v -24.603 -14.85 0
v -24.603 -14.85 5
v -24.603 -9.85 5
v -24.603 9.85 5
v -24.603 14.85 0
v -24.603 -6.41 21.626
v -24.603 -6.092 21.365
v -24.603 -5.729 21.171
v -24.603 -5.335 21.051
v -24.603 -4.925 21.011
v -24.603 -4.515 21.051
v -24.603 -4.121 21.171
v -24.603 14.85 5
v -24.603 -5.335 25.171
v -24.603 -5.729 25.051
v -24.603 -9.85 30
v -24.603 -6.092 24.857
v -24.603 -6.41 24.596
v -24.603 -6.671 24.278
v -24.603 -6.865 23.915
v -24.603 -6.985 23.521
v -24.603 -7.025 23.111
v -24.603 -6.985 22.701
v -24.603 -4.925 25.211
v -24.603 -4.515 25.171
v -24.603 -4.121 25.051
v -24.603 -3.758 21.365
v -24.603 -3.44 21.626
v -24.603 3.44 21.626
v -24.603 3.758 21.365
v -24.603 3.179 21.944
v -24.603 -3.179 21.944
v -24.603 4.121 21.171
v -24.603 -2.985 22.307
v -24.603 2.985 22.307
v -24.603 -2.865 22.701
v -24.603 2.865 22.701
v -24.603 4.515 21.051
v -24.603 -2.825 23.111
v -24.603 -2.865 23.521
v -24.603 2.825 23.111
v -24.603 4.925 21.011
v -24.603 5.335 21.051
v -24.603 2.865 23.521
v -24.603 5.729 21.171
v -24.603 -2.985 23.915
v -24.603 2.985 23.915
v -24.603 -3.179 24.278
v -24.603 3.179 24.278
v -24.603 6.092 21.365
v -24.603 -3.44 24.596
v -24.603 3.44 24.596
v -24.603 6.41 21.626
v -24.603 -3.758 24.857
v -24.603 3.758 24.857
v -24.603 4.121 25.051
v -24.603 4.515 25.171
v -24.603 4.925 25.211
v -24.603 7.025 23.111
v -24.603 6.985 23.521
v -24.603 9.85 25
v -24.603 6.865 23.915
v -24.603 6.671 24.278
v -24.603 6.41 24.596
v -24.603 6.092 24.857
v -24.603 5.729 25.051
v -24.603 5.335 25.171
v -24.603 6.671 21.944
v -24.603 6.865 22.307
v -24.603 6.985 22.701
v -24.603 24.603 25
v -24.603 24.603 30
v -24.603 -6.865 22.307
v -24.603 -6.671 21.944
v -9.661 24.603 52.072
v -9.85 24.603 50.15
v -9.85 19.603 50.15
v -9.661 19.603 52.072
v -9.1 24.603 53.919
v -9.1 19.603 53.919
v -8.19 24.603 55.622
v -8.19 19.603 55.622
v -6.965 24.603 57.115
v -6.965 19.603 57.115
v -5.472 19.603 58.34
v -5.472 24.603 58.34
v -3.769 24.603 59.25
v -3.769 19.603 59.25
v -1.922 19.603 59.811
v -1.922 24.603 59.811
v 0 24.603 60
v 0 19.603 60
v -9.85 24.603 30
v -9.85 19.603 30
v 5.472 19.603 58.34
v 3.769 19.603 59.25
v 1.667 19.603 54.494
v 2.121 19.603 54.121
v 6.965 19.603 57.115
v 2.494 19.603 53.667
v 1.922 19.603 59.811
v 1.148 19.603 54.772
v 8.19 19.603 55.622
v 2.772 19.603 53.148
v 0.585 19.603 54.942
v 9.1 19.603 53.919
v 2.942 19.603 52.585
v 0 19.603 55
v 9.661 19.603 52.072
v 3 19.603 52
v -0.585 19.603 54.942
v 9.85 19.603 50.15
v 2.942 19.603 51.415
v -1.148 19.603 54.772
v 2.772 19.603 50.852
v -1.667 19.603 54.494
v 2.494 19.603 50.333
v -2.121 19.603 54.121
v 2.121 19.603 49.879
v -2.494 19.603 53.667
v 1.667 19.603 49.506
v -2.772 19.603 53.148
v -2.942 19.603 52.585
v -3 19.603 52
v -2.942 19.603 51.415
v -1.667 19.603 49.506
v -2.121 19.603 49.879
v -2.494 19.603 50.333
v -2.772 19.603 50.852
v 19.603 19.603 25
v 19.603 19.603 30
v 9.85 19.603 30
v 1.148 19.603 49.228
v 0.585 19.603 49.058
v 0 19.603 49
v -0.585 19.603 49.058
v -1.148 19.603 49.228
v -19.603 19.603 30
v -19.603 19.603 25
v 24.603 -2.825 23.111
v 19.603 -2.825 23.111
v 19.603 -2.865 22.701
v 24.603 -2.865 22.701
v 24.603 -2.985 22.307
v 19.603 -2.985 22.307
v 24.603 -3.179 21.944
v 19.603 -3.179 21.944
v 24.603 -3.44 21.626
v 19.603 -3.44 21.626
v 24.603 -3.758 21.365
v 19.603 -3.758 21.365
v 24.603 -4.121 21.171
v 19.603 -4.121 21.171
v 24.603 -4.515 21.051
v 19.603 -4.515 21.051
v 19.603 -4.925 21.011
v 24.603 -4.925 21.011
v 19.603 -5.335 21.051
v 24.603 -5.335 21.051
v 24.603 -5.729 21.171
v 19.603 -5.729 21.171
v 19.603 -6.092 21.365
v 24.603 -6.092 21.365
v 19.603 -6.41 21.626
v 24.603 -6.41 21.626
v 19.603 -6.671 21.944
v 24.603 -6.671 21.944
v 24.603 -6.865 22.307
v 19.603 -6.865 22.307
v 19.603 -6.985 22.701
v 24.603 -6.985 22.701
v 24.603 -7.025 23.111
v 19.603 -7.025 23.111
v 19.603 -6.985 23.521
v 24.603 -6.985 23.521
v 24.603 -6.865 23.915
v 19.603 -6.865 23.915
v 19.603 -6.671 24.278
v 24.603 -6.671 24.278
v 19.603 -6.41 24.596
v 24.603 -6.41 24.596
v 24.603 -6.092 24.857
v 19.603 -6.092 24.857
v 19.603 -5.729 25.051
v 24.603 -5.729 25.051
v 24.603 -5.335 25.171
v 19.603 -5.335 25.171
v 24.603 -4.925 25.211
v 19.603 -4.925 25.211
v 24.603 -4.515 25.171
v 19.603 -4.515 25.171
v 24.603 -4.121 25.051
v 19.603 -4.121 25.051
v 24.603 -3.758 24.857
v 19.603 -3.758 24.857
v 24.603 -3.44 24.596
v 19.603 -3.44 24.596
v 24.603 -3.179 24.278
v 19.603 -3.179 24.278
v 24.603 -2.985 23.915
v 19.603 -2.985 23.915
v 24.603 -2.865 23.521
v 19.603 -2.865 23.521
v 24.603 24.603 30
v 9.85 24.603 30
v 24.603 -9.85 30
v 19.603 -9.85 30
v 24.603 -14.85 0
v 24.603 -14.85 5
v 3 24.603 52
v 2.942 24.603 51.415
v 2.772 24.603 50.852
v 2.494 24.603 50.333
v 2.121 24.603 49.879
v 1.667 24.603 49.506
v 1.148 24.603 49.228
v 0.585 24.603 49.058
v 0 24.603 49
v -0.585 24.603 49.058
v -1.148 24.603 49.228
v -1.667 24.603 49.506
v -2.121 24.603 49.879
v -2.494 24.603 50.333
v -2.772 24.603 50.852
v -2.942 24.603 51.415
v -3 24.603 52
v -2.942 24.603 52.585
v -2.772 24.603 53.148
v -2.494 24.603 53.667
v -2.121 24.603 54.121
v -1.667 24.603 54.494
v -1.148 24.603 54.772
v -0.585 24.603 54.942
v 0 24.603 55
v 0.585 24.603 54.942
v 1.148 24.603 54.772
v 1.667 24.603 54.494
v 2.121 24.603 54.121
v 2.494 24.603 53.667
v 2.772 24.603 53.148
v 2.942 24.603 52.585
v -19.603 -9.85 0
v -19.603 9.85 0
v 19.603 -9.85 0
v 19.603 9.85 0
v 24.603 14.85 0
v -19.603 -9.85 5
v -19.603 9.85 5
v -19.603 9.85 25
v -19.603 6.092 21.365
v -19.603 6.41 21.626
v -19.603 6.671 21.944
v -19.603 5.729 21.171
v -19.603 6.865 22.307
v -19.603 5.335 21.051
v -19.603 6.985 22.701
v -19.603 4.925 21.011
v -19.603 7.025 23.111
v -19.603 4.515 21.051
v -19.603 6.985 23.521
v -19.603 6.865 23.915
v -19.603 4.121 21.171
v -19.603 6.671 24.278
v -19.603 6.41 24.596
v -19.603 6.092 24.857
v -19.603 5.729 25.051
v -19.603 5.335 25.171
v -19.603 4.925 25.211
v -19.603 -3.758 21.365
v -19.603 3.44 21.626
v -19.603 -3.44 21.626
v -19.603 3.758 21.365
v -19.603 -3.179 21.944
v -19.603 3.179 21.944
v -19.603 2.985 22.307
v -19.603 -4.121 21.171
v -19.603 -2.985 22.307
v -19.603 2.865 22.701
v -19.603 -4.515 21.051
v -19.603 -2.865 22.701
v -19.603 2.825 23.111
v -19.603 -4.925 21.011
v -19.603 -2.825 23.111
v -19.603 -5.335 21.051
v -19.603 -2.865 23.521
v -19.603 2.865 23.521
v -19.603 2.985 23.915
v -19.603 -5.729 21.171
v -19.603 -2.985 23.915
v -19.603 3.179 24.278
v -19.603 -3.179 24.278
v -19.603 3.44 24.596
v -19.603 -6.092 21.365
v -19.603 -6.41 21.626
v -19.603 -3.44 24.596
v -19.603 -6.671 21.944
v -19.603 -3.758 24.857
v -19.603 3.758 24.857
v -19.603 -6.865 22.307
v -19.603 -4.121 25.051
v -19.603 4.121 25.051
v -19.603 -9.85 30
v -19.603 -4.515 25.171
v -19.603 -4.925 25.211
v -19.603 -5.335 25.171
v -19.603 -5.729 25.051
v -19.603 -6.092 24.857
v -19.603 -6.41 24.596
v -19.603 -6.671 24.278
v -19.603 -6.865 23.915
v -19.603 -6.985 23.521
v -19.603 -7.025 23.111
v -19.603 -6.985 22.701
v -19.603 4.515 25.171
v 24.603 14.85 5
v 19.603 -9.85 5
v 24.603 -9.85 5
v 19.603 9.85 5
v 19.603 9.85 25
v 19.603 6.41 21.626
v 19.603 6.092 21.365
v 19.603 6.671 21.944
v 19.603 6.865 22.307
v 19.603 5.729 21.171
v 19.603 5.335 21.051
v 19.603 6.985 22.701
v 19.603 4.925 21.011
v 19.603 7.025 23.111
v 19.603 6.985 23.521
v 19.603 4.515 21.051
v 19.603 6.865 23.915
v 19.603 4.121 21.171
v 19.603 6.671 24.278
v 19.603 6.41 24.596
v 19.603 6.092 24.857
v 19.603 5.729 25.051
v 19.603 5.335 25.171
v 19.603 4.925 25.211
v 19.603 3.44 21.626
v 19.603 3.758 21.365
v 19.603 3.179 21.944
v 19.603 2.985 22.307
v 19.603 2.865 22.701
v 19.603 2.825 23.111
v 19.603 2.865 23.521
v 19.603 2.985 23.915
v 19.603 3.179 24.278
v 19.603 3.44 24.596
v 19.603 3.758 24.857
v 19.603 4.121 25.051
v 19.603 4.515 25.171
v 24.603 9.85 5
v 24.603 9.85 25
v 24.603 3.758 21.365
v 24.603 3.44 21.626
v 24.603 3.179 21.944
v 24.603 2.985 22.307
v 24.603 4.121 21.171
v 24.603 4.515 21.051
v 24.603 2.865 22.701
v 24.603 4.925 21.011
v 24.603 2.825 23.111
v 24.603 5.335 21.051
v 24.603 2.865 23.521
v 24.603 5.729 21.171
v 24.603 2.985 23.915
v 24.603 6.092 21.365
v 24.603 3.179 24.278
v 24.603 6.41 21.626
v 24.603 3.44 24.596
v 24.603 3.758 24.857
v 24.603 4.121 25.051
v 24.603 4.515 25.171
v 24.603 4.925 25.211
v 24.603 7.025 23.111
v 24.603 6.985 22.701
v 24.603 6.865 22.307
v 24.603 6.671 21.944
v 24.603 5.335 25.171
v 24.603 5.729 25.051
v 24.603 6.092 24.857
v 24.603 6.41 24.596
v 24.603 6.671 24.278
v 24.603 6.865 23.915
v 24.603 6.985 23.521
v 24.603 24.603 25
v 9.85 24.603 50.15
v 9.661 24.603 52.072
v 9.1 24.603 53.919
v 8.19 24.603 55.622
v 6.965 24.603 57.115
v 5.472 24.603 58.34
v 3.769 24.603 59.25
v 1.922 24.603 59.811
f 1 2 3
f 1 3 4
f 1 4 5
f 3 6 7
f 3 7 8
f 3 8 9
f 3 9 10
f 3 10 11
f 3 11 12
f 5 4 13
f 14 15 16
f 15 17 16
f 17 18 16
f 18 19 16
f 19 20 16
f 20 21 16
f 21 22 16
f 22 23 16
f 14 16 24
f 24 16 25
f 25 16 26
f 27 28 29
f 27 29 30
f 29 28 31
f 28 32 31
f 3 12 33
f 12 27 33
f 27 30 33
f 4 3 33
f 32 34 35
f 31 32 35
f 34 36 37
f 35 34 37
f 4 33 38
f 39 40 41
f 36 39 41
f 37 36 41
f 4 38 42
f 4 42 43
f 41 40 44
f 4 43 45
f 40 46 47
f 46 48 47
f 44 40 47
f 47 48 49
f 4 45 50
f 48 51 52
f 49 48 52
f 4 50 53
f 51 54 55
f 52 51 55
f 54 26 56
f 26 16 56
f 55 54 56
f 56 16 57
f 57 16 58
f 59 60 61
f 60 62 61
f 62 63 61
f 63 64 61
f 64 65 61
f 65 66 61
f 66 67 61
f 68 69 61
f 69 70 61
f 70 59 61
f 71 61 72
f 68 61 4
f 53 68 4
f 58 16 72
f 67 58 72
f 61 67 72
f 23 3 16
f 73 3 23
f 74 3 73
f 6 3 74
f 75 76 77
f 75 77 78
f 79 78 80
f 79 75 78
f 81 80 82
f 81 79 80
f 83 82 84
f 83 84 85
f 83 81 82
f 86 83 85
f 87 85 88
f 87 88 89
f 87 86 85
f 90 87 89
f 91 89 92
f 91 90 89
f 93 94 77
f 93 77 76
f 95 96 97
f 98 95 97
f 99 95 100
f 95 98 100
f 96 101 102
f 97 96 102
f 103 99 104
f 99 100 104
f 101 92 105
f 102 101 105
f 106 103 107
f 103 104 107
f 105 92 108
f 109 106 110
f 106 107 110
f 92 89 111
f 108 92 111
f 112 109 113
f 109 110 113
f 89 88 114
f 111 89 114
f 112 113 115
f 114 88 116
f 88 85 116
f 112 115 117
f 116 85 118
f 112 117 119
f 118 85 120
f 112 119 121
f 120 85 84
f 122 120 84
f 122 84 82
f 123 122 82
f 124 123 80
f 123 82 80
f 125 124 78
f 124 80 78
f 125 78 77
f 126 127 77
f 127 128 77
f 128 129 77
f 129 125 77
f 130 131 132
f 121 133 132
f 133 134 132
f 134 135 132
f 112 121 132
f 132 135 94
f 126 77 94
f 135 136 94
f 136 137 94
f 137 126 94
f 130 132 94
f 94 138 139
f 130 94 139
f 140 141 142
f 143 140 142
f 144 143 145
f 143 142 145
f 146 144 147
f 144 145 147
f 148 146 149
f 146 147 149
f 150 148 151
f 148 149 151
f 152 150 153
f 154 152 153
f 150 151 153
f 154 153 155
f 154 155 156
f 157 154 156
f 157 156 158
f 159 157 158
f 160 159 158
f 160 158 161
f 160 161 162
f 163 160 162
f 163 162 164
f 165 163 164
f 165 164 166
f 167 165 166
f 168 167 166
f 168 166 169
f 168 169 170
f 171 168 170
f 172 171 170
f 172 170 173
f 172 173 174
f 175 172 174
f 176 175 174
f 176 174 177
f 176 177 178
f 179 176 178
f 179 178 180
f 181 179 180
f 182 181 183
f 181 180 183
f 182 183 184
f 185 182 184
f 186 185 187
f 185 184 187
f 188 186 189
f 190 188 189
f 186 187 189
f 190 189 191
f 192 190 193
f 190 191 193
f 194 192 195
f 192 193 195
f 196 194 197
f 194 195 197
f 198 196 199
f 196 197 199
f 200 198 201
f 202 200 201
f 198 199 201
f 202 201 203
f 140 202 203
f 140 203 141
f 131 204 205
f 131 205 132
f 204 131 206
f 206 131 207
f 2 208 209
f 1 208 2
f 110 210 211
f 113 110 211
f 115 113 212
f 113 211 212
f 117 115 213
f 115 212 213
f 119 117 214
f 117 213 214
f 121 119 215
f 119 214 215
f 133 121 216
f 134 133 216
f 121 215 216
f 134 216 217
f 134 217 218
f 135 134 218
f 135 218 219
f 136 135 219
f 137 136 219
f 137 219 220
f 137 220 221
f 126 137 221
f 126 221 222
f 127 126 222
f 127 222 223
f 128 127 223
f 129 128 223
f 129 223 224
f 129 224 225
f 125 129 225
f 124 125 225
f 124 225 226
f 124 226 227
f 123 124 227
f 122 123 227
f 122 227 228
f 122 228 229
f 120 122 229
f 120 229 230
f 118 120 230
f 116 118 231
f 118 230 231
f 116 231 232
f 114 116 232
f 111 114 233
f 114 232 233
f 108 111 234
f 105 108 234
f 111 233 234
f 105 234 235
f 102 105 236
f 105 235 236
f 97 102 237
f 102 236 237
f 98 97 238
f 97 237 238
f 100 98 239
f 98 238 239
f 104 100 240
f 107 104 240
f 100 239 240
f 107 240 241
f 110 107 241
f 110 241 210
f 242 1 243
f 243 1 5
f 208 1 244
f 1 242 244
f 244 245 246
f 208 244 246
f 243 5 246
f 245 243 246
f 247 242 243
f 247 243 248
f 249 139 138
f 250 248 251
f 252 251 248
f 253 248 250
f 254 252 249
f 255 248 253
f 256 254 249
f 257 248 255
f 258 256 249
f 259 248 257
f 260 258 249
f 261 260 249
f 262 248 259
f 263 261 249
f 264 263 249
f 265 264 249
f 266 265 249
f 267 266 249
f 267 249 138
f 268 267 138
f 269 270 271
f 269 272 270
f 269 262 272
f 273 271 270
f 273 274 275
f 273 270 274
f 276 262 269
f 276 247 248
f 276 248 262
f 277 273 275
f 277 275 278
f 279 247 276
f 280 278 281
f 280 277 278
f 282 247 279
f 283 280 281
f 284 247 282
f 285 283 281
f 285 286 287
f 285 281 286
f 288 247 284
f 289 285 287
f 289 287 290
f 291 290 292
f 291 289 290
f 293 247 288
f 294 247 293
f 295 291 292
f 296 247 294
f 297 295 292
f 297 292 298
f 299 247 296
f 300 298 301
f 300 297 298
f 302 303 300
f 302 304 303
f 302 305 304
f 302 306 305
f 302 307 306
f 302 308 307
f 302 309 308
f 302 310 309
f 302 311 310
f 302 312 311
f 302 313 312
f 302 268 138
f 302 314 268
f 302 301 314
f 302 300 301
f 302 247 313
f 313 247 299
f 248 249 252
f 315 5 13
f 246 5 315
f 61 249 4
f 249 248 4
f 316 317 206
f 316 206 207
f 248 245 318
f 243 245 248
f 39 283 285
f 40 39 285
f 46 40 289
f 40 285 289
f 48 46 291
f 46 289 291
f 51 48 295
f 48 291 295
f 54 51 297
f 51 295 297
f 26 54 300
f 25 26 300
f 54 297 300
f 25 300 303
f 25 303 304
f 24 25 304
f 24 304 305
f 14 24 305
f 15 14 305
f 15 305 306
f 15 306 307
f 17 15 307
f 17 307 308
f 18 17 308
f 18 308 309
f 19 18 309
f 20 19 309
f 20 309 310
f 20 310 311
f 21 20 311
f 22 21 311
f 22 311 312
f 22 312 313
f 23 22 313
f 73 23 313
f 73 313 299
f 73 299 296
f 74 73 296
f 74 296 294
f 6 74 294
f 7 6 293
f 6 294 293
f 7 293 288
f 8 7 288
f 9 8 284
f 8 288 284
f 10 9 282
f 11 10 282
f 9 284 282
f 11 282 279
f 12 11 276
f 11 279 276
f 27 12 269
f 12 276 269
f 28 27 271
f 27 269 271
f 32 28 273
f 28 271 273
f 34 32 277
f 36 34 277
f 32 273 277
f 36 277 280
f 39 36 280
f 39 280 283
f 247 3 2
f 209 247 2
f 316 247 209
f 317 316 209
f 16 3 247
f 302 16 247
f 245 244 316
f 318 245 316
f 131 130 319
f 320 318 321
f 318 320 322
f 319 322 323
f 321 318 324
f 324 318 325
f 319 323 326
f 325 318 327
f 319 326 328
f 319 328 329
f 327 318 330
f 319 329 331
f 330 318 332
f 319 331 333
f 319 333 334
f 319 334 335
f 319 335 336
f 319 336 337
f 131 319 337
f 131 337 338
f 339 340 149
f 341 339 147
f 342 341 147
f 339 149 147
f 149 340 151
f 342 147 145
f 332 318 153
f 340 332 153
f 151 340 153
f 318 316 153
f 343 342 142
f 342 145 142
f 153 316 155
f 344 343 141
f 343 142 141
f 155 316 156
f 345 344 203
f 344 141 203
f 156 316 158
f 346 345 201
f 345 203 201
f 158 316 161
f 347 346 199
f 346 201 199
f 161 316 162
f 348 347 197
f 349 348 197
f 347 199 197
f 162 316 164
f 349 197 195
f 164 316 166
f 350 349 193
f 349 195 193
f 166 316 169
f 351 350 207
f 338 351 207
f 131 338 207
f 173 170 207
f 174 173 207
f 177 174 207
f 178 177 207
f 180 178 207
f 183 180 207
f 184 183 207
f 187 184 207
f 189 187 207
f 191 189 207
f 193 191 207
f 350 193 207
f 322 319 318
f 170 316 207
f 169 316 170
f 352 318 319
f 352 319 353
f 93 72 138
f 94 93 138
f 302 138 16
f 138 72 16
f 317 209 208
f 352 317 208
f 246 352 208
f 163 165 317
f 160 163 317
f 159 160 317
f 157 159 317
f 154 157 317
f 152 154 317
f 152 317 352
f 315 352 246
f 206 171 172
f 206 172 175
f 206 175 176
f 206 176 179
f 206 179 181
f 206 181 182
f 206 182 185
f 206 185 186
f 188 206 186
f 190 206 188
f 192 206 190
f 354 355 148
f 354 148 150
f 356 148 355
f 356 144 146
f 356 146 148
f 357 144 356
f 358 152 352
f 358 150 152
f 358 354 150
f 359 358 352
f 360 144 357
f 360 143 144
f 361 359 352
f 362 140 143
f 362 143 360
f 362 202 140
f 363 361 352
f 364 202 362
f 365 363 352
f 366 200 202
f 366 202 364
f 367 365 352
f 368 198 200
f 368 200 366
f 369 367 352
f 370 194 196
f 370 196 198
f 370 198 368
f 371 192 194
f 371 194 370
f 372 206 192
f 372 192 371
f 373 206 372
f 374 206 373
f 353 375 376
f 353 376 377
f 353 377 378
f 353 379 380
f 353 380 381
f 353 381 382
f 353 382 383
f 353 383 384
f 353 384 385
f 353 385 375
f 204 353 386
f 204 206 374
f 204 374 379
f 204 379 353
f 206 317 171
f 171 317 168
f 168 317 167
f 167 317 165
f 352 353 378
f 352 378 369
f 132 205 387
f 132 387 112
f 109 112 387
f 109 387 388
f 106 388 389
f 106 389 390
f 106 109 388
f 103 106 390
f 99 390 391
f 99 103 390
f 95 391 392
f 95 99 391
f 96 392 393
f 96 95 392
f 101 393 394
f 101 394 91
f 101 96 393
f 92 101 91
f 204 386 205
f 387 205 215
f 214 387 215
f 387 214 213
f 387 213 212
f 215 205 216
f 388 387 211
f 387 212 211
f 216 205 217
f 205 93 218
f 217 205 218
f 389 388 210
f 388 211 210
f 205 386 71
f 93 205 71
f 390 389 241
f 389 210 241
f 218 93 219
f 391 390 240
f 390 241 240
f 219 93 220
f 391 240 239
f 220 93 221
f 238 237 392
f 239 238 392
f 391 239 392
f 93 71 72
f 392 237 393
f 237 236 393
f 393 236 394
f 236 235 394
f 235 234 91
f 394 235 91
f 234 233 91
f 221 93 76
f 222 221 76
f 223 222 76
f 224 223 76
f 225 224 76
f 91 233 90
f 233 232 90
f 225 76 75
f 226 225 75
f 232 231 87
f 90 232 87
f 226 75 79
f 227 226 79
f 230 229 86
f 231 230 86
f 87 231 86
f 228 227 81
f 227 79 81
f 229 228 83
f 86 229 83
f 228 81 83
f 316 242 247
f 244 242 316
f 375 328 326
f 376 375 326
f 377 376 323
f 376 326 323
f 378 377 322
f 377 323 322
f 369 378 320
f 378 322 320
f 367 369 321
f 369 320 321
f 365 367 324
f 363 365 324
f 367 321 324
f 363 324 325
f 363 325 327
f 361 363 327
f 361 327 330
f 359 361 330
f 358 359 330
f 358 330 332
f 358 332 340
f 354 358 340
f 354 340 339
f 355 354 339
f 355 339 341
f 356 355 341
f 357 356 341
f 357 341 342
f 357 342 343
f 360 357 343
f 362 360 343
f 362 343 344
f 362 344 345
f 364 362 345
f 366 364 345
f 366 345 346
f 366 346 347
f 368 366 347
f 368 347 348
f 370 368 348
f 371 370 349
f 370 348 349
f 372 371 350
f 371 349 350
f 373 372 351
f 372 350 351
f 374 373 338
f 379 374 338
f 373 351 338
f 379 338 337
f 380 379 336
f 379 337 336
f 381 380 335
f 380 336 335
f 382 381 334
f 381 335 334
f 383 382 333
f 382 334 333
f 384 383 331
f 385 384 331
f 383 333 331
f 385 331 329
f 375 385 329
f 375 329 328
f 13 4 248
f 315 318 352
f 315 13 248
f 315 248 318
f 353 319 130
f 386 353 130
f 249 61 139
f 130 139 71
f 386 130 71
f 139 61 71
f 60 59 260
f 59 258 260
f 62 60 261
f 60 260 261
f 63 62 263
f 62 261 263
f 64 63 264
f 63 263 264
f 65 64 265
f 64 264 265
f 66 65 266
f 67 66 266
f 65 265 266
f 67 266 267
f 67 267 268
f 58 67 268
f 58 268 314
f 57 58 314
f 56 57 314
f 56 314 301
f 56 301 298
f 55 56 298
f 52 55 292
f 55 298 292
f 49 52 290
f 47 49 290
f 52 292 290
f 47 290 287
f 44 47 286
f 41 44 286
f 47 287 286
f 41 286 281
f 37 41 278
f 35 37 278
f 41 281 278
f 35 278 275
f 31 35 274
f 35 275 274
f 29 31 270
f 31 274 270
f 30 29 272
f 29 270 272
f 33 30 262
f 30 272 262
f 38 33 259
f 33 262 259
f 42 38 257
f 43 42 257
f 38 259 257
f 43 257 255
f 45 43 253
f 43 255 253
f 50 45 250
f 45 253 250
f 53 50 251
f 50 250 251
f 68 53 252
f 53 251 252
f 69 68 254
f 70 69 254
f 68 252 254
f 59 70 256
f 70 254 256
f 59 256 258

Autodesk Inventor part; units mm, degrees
ref_plane "YZ Plane" through (0, 0, 0) normal (1, 0, 0) x (0, 1, 0)
ref_plane "XZ Plane" through (0, 0, 0) normal (0, 1, 0) x (-1, 0, 0)
ref_plane "XY Plane" through (0, 0, 0) normal (0, 0, 1) x (1, 0, 0)
sketch "Sketch1" plane through (0, 0, 0) normal (0, 0, 1) x (1, 0, 0)
  line L0 (-19.603, -9.85) -> (19.603, -9.85)
  line L1 (19.603, -9.85) -> (19.603, 9.85)
  line L2 (19.603, 9.85) -> (-19.603, 9.85)
  line L3 (-19.603, 9.85) -> (-19.603, -9.85)
  line L4 (-19.603, -9.85) -> (19.603, 9.85) construction
  line L5 (19.603, -9.85) -> (-19.603, 9.85) construction
  line L6 (-24.603, 14.85) -> (24.603, 14.85)
  line L7 (24.603, 14.85) -> (24.603, -14.85)
  line L8 (24.603, -14.85) -> (-24.603, -14.85)
  line L9 (-24.603, -14.85) -> (-24.603, 14.85)
  point P0 (0, 0)
  dimension "d0" = 39.206
  dimension "d1" = 19.7
  dimension "d2" = 5
extrude "Extrusion1" add sketch "Sketch1" along normal blind 5
sketch "Sketch2" plane through (0, 0, 5) normal (0, 0, 1) x (1, 0, 0)
  line L0 (-24.603, 14.85) -> (-24.603, -14.85) construction
  line L1 (-24.603, 14.85) -> (-24.603, -14.85) construction
  line L2 (24.603, 14.85) -> (-24.603, 14.85) construction
  line L3 (-24.603, 14.85) -> (24.603, 14.85) construction
  line L4 (24.603, -14.85) -> (24.603, 14.85) construction
  line L5 (24.603, 14.85) -> (24.603, -14.85) construction
  line L6 (24.603, -14.85) -> (-24.603, -14.85) construction
  line L7 (-19.603, -9.85) -> (-19.603, 9.85) projected
  line L8 (-19.603, 9.85) -> (-24.603, 9.85)
  line L9 (-24.603, 9.85) -> (-24.603, -9.85)
  line L10 (-24.603, -9.85) -> (-19.603, -9.85)
  line L11 (-19.603, -9.85) -> (-19.603, 9.85)
  line L12 (19.603, 9.85) -> (19.603, -9.85) projected
  line L13 (19.603, 9.85) -> (24.603, 9.85)
  line L14 (24.603, 9.85) -> (24.603, -9.85)
  line L15 (24.603, -9.85) -> (19.603, -9.85)
  line L16 (19.603, -9.85) -> (19.603, 9.85)
  point P0 (0, 0)
extrude "Extrusion2" add sketch "Sketch2" along normal blind 25
sketch "Sketch3" plane through (0, 0, 0) normal (1, 0, 0) x (0, 1, 0)
  circle A0 centre (4.925, 23.111) radius 2.1
  line L0 (14.85, 0) -> (14.85, 5) projected
  line L1 (14.85, 5) -> (9.85, 5) projected
  circle A1 centre (-4.925, 23.111) radius 2.1
  line L2 (-14.85, 0) -> (-14.85, 5) projected
  line L3 (-9.85, 5) -> (-14.85, 5) projected
  point P0 (0, 0)
  point P1 (-12.35, 5)
  dimension "d7" = 4.2
  dimension "d8" = 9.925
  dimension "d9" = 18.111
  dimension "d10" = 4.2
  dimension "d11" = 9.925
  dimension "d12" = 18.111
extrude "Extrusion3" cut sketch "Sketch3" along normal through all both and the other way through all
sketch "Sketch4" plane through (0, 0, 0) normal (1, 0, 0) x (0, 1, 0)
  line L0 (-9.85, 30) -> (9.85, 30) construction
  line L1 (0, 30) -> (0, 0) construction
  line L2 (24.603, 30) -> (19.603, 30)
  line L3 (19.603, 30) -> (19.603, 25)
  line L4 (19.603, 25) -> (24.603, 25)
  line L5 (24.603, 25) -> (24.603, 30)
  line L6 (14.85, 0) -> (-14.85, 0) projected
  point P0 (19.603, 27.5)
  dimension "d29" = 5
  dimension "d30" = 5
  dimension "d31" = 19.603
  dimension "d32" = 25
extrude "Extrusion4" add sketch "Sketch4" along normal mid plane 49.206
sketch "Sketch5" plane through (0, 0, 30) normal (0, 0, 1) x (1, 0, 0)
  line L0 (-24.603, -9.85) -> (-24.603, 14.85) projected
  line L1 (24.603, -9.85) -> (24.603, 14.85) projected
  line L2 (-24.603, 24.603) -> (24.603, 24.603) projected
  line L3 (-9.85, 24.603) -> (9.85, 24.603)
  line L4 (9.85, 24.603) -> (9.85, 19.603)
  line L5 (9.85, 19.603) -> (-9.85, 19.603)
  line L6 (-9.85, 19.603) -> (-9.85, 24.603)
  line L7 (24.603, 24.603) -> (24.603, 19.603) projected
  line L8 (-24.603, 19.603) -> (-24.603, 24.603) projected
  point P0 (0, 0)
  point P1 (9.85, 22.103)
  point P2 (-24.603, 22.103)
  point P3 (9.85, 24.603)
  dimension "d33" = 19.7
  dimension "d34" = 5
  dimension "d35" = 14.753
  dimension "d36" = 14.753
extrude "Extrusion5" add sketch "Sketch5" along normal blind 30
sketch "Sketch7" plane through (19.603, 9.85, 5) normal (0, 1, 0) x (1, 0, 0)
  line L0 (-39.206, 0) -> (-39.206, -25) projected
  line L1 (-39.206, -25) -> (-44.206, -25)
  line L2 (-44.206, -25) -> (-44.206, -20)
  line L3 (-44.206, -20) -> (-39.206, -20)
  line L4 (-39.206, -20) -> (-39.206, -25)
  line L5 (0, 0) -> (0, -25) projected
  line L6 (0, -25) -> (5, -25)
  line L7 (5, -25) -> (5, -20)
  line L8 (5, -20) -> (0, -20)
  line L9 (0, -20) -> (0, -25)
  point P0 (-19.603, 5)
  dimension "d37" = 5
  dimension "d38" = 5
  dimension "d39" = 5
  dimension "d40" = 5
extrude "Extrusion7" add sketch "Sketch7" along normal through all
sketch "Sketch8" plane through (-24.603, 24.603, 25) normal (0, 1, 0) x (1, 0, 0)
  line L0 (14.753, -35) -> (34.453, -35) construction
  line L1 (24.603, -35) -> (24.603, 0) construction
  line L2 (5, 0) -> (44.206, 0) construction
  circle A0 centre (24.603, -27) radius 3
  point P0 (24.603, 25)
  dimension "d43" = 6
  dimension "d44" = 8
extrude "Extrusion8" cut sketch "Sketch8" against normal through all
fillet "Fillet1" radius 9.85 2 edges at (9.85, 22.103, 60) (-9.85, 22.103, 60)
properties part number "Part2_cage"
